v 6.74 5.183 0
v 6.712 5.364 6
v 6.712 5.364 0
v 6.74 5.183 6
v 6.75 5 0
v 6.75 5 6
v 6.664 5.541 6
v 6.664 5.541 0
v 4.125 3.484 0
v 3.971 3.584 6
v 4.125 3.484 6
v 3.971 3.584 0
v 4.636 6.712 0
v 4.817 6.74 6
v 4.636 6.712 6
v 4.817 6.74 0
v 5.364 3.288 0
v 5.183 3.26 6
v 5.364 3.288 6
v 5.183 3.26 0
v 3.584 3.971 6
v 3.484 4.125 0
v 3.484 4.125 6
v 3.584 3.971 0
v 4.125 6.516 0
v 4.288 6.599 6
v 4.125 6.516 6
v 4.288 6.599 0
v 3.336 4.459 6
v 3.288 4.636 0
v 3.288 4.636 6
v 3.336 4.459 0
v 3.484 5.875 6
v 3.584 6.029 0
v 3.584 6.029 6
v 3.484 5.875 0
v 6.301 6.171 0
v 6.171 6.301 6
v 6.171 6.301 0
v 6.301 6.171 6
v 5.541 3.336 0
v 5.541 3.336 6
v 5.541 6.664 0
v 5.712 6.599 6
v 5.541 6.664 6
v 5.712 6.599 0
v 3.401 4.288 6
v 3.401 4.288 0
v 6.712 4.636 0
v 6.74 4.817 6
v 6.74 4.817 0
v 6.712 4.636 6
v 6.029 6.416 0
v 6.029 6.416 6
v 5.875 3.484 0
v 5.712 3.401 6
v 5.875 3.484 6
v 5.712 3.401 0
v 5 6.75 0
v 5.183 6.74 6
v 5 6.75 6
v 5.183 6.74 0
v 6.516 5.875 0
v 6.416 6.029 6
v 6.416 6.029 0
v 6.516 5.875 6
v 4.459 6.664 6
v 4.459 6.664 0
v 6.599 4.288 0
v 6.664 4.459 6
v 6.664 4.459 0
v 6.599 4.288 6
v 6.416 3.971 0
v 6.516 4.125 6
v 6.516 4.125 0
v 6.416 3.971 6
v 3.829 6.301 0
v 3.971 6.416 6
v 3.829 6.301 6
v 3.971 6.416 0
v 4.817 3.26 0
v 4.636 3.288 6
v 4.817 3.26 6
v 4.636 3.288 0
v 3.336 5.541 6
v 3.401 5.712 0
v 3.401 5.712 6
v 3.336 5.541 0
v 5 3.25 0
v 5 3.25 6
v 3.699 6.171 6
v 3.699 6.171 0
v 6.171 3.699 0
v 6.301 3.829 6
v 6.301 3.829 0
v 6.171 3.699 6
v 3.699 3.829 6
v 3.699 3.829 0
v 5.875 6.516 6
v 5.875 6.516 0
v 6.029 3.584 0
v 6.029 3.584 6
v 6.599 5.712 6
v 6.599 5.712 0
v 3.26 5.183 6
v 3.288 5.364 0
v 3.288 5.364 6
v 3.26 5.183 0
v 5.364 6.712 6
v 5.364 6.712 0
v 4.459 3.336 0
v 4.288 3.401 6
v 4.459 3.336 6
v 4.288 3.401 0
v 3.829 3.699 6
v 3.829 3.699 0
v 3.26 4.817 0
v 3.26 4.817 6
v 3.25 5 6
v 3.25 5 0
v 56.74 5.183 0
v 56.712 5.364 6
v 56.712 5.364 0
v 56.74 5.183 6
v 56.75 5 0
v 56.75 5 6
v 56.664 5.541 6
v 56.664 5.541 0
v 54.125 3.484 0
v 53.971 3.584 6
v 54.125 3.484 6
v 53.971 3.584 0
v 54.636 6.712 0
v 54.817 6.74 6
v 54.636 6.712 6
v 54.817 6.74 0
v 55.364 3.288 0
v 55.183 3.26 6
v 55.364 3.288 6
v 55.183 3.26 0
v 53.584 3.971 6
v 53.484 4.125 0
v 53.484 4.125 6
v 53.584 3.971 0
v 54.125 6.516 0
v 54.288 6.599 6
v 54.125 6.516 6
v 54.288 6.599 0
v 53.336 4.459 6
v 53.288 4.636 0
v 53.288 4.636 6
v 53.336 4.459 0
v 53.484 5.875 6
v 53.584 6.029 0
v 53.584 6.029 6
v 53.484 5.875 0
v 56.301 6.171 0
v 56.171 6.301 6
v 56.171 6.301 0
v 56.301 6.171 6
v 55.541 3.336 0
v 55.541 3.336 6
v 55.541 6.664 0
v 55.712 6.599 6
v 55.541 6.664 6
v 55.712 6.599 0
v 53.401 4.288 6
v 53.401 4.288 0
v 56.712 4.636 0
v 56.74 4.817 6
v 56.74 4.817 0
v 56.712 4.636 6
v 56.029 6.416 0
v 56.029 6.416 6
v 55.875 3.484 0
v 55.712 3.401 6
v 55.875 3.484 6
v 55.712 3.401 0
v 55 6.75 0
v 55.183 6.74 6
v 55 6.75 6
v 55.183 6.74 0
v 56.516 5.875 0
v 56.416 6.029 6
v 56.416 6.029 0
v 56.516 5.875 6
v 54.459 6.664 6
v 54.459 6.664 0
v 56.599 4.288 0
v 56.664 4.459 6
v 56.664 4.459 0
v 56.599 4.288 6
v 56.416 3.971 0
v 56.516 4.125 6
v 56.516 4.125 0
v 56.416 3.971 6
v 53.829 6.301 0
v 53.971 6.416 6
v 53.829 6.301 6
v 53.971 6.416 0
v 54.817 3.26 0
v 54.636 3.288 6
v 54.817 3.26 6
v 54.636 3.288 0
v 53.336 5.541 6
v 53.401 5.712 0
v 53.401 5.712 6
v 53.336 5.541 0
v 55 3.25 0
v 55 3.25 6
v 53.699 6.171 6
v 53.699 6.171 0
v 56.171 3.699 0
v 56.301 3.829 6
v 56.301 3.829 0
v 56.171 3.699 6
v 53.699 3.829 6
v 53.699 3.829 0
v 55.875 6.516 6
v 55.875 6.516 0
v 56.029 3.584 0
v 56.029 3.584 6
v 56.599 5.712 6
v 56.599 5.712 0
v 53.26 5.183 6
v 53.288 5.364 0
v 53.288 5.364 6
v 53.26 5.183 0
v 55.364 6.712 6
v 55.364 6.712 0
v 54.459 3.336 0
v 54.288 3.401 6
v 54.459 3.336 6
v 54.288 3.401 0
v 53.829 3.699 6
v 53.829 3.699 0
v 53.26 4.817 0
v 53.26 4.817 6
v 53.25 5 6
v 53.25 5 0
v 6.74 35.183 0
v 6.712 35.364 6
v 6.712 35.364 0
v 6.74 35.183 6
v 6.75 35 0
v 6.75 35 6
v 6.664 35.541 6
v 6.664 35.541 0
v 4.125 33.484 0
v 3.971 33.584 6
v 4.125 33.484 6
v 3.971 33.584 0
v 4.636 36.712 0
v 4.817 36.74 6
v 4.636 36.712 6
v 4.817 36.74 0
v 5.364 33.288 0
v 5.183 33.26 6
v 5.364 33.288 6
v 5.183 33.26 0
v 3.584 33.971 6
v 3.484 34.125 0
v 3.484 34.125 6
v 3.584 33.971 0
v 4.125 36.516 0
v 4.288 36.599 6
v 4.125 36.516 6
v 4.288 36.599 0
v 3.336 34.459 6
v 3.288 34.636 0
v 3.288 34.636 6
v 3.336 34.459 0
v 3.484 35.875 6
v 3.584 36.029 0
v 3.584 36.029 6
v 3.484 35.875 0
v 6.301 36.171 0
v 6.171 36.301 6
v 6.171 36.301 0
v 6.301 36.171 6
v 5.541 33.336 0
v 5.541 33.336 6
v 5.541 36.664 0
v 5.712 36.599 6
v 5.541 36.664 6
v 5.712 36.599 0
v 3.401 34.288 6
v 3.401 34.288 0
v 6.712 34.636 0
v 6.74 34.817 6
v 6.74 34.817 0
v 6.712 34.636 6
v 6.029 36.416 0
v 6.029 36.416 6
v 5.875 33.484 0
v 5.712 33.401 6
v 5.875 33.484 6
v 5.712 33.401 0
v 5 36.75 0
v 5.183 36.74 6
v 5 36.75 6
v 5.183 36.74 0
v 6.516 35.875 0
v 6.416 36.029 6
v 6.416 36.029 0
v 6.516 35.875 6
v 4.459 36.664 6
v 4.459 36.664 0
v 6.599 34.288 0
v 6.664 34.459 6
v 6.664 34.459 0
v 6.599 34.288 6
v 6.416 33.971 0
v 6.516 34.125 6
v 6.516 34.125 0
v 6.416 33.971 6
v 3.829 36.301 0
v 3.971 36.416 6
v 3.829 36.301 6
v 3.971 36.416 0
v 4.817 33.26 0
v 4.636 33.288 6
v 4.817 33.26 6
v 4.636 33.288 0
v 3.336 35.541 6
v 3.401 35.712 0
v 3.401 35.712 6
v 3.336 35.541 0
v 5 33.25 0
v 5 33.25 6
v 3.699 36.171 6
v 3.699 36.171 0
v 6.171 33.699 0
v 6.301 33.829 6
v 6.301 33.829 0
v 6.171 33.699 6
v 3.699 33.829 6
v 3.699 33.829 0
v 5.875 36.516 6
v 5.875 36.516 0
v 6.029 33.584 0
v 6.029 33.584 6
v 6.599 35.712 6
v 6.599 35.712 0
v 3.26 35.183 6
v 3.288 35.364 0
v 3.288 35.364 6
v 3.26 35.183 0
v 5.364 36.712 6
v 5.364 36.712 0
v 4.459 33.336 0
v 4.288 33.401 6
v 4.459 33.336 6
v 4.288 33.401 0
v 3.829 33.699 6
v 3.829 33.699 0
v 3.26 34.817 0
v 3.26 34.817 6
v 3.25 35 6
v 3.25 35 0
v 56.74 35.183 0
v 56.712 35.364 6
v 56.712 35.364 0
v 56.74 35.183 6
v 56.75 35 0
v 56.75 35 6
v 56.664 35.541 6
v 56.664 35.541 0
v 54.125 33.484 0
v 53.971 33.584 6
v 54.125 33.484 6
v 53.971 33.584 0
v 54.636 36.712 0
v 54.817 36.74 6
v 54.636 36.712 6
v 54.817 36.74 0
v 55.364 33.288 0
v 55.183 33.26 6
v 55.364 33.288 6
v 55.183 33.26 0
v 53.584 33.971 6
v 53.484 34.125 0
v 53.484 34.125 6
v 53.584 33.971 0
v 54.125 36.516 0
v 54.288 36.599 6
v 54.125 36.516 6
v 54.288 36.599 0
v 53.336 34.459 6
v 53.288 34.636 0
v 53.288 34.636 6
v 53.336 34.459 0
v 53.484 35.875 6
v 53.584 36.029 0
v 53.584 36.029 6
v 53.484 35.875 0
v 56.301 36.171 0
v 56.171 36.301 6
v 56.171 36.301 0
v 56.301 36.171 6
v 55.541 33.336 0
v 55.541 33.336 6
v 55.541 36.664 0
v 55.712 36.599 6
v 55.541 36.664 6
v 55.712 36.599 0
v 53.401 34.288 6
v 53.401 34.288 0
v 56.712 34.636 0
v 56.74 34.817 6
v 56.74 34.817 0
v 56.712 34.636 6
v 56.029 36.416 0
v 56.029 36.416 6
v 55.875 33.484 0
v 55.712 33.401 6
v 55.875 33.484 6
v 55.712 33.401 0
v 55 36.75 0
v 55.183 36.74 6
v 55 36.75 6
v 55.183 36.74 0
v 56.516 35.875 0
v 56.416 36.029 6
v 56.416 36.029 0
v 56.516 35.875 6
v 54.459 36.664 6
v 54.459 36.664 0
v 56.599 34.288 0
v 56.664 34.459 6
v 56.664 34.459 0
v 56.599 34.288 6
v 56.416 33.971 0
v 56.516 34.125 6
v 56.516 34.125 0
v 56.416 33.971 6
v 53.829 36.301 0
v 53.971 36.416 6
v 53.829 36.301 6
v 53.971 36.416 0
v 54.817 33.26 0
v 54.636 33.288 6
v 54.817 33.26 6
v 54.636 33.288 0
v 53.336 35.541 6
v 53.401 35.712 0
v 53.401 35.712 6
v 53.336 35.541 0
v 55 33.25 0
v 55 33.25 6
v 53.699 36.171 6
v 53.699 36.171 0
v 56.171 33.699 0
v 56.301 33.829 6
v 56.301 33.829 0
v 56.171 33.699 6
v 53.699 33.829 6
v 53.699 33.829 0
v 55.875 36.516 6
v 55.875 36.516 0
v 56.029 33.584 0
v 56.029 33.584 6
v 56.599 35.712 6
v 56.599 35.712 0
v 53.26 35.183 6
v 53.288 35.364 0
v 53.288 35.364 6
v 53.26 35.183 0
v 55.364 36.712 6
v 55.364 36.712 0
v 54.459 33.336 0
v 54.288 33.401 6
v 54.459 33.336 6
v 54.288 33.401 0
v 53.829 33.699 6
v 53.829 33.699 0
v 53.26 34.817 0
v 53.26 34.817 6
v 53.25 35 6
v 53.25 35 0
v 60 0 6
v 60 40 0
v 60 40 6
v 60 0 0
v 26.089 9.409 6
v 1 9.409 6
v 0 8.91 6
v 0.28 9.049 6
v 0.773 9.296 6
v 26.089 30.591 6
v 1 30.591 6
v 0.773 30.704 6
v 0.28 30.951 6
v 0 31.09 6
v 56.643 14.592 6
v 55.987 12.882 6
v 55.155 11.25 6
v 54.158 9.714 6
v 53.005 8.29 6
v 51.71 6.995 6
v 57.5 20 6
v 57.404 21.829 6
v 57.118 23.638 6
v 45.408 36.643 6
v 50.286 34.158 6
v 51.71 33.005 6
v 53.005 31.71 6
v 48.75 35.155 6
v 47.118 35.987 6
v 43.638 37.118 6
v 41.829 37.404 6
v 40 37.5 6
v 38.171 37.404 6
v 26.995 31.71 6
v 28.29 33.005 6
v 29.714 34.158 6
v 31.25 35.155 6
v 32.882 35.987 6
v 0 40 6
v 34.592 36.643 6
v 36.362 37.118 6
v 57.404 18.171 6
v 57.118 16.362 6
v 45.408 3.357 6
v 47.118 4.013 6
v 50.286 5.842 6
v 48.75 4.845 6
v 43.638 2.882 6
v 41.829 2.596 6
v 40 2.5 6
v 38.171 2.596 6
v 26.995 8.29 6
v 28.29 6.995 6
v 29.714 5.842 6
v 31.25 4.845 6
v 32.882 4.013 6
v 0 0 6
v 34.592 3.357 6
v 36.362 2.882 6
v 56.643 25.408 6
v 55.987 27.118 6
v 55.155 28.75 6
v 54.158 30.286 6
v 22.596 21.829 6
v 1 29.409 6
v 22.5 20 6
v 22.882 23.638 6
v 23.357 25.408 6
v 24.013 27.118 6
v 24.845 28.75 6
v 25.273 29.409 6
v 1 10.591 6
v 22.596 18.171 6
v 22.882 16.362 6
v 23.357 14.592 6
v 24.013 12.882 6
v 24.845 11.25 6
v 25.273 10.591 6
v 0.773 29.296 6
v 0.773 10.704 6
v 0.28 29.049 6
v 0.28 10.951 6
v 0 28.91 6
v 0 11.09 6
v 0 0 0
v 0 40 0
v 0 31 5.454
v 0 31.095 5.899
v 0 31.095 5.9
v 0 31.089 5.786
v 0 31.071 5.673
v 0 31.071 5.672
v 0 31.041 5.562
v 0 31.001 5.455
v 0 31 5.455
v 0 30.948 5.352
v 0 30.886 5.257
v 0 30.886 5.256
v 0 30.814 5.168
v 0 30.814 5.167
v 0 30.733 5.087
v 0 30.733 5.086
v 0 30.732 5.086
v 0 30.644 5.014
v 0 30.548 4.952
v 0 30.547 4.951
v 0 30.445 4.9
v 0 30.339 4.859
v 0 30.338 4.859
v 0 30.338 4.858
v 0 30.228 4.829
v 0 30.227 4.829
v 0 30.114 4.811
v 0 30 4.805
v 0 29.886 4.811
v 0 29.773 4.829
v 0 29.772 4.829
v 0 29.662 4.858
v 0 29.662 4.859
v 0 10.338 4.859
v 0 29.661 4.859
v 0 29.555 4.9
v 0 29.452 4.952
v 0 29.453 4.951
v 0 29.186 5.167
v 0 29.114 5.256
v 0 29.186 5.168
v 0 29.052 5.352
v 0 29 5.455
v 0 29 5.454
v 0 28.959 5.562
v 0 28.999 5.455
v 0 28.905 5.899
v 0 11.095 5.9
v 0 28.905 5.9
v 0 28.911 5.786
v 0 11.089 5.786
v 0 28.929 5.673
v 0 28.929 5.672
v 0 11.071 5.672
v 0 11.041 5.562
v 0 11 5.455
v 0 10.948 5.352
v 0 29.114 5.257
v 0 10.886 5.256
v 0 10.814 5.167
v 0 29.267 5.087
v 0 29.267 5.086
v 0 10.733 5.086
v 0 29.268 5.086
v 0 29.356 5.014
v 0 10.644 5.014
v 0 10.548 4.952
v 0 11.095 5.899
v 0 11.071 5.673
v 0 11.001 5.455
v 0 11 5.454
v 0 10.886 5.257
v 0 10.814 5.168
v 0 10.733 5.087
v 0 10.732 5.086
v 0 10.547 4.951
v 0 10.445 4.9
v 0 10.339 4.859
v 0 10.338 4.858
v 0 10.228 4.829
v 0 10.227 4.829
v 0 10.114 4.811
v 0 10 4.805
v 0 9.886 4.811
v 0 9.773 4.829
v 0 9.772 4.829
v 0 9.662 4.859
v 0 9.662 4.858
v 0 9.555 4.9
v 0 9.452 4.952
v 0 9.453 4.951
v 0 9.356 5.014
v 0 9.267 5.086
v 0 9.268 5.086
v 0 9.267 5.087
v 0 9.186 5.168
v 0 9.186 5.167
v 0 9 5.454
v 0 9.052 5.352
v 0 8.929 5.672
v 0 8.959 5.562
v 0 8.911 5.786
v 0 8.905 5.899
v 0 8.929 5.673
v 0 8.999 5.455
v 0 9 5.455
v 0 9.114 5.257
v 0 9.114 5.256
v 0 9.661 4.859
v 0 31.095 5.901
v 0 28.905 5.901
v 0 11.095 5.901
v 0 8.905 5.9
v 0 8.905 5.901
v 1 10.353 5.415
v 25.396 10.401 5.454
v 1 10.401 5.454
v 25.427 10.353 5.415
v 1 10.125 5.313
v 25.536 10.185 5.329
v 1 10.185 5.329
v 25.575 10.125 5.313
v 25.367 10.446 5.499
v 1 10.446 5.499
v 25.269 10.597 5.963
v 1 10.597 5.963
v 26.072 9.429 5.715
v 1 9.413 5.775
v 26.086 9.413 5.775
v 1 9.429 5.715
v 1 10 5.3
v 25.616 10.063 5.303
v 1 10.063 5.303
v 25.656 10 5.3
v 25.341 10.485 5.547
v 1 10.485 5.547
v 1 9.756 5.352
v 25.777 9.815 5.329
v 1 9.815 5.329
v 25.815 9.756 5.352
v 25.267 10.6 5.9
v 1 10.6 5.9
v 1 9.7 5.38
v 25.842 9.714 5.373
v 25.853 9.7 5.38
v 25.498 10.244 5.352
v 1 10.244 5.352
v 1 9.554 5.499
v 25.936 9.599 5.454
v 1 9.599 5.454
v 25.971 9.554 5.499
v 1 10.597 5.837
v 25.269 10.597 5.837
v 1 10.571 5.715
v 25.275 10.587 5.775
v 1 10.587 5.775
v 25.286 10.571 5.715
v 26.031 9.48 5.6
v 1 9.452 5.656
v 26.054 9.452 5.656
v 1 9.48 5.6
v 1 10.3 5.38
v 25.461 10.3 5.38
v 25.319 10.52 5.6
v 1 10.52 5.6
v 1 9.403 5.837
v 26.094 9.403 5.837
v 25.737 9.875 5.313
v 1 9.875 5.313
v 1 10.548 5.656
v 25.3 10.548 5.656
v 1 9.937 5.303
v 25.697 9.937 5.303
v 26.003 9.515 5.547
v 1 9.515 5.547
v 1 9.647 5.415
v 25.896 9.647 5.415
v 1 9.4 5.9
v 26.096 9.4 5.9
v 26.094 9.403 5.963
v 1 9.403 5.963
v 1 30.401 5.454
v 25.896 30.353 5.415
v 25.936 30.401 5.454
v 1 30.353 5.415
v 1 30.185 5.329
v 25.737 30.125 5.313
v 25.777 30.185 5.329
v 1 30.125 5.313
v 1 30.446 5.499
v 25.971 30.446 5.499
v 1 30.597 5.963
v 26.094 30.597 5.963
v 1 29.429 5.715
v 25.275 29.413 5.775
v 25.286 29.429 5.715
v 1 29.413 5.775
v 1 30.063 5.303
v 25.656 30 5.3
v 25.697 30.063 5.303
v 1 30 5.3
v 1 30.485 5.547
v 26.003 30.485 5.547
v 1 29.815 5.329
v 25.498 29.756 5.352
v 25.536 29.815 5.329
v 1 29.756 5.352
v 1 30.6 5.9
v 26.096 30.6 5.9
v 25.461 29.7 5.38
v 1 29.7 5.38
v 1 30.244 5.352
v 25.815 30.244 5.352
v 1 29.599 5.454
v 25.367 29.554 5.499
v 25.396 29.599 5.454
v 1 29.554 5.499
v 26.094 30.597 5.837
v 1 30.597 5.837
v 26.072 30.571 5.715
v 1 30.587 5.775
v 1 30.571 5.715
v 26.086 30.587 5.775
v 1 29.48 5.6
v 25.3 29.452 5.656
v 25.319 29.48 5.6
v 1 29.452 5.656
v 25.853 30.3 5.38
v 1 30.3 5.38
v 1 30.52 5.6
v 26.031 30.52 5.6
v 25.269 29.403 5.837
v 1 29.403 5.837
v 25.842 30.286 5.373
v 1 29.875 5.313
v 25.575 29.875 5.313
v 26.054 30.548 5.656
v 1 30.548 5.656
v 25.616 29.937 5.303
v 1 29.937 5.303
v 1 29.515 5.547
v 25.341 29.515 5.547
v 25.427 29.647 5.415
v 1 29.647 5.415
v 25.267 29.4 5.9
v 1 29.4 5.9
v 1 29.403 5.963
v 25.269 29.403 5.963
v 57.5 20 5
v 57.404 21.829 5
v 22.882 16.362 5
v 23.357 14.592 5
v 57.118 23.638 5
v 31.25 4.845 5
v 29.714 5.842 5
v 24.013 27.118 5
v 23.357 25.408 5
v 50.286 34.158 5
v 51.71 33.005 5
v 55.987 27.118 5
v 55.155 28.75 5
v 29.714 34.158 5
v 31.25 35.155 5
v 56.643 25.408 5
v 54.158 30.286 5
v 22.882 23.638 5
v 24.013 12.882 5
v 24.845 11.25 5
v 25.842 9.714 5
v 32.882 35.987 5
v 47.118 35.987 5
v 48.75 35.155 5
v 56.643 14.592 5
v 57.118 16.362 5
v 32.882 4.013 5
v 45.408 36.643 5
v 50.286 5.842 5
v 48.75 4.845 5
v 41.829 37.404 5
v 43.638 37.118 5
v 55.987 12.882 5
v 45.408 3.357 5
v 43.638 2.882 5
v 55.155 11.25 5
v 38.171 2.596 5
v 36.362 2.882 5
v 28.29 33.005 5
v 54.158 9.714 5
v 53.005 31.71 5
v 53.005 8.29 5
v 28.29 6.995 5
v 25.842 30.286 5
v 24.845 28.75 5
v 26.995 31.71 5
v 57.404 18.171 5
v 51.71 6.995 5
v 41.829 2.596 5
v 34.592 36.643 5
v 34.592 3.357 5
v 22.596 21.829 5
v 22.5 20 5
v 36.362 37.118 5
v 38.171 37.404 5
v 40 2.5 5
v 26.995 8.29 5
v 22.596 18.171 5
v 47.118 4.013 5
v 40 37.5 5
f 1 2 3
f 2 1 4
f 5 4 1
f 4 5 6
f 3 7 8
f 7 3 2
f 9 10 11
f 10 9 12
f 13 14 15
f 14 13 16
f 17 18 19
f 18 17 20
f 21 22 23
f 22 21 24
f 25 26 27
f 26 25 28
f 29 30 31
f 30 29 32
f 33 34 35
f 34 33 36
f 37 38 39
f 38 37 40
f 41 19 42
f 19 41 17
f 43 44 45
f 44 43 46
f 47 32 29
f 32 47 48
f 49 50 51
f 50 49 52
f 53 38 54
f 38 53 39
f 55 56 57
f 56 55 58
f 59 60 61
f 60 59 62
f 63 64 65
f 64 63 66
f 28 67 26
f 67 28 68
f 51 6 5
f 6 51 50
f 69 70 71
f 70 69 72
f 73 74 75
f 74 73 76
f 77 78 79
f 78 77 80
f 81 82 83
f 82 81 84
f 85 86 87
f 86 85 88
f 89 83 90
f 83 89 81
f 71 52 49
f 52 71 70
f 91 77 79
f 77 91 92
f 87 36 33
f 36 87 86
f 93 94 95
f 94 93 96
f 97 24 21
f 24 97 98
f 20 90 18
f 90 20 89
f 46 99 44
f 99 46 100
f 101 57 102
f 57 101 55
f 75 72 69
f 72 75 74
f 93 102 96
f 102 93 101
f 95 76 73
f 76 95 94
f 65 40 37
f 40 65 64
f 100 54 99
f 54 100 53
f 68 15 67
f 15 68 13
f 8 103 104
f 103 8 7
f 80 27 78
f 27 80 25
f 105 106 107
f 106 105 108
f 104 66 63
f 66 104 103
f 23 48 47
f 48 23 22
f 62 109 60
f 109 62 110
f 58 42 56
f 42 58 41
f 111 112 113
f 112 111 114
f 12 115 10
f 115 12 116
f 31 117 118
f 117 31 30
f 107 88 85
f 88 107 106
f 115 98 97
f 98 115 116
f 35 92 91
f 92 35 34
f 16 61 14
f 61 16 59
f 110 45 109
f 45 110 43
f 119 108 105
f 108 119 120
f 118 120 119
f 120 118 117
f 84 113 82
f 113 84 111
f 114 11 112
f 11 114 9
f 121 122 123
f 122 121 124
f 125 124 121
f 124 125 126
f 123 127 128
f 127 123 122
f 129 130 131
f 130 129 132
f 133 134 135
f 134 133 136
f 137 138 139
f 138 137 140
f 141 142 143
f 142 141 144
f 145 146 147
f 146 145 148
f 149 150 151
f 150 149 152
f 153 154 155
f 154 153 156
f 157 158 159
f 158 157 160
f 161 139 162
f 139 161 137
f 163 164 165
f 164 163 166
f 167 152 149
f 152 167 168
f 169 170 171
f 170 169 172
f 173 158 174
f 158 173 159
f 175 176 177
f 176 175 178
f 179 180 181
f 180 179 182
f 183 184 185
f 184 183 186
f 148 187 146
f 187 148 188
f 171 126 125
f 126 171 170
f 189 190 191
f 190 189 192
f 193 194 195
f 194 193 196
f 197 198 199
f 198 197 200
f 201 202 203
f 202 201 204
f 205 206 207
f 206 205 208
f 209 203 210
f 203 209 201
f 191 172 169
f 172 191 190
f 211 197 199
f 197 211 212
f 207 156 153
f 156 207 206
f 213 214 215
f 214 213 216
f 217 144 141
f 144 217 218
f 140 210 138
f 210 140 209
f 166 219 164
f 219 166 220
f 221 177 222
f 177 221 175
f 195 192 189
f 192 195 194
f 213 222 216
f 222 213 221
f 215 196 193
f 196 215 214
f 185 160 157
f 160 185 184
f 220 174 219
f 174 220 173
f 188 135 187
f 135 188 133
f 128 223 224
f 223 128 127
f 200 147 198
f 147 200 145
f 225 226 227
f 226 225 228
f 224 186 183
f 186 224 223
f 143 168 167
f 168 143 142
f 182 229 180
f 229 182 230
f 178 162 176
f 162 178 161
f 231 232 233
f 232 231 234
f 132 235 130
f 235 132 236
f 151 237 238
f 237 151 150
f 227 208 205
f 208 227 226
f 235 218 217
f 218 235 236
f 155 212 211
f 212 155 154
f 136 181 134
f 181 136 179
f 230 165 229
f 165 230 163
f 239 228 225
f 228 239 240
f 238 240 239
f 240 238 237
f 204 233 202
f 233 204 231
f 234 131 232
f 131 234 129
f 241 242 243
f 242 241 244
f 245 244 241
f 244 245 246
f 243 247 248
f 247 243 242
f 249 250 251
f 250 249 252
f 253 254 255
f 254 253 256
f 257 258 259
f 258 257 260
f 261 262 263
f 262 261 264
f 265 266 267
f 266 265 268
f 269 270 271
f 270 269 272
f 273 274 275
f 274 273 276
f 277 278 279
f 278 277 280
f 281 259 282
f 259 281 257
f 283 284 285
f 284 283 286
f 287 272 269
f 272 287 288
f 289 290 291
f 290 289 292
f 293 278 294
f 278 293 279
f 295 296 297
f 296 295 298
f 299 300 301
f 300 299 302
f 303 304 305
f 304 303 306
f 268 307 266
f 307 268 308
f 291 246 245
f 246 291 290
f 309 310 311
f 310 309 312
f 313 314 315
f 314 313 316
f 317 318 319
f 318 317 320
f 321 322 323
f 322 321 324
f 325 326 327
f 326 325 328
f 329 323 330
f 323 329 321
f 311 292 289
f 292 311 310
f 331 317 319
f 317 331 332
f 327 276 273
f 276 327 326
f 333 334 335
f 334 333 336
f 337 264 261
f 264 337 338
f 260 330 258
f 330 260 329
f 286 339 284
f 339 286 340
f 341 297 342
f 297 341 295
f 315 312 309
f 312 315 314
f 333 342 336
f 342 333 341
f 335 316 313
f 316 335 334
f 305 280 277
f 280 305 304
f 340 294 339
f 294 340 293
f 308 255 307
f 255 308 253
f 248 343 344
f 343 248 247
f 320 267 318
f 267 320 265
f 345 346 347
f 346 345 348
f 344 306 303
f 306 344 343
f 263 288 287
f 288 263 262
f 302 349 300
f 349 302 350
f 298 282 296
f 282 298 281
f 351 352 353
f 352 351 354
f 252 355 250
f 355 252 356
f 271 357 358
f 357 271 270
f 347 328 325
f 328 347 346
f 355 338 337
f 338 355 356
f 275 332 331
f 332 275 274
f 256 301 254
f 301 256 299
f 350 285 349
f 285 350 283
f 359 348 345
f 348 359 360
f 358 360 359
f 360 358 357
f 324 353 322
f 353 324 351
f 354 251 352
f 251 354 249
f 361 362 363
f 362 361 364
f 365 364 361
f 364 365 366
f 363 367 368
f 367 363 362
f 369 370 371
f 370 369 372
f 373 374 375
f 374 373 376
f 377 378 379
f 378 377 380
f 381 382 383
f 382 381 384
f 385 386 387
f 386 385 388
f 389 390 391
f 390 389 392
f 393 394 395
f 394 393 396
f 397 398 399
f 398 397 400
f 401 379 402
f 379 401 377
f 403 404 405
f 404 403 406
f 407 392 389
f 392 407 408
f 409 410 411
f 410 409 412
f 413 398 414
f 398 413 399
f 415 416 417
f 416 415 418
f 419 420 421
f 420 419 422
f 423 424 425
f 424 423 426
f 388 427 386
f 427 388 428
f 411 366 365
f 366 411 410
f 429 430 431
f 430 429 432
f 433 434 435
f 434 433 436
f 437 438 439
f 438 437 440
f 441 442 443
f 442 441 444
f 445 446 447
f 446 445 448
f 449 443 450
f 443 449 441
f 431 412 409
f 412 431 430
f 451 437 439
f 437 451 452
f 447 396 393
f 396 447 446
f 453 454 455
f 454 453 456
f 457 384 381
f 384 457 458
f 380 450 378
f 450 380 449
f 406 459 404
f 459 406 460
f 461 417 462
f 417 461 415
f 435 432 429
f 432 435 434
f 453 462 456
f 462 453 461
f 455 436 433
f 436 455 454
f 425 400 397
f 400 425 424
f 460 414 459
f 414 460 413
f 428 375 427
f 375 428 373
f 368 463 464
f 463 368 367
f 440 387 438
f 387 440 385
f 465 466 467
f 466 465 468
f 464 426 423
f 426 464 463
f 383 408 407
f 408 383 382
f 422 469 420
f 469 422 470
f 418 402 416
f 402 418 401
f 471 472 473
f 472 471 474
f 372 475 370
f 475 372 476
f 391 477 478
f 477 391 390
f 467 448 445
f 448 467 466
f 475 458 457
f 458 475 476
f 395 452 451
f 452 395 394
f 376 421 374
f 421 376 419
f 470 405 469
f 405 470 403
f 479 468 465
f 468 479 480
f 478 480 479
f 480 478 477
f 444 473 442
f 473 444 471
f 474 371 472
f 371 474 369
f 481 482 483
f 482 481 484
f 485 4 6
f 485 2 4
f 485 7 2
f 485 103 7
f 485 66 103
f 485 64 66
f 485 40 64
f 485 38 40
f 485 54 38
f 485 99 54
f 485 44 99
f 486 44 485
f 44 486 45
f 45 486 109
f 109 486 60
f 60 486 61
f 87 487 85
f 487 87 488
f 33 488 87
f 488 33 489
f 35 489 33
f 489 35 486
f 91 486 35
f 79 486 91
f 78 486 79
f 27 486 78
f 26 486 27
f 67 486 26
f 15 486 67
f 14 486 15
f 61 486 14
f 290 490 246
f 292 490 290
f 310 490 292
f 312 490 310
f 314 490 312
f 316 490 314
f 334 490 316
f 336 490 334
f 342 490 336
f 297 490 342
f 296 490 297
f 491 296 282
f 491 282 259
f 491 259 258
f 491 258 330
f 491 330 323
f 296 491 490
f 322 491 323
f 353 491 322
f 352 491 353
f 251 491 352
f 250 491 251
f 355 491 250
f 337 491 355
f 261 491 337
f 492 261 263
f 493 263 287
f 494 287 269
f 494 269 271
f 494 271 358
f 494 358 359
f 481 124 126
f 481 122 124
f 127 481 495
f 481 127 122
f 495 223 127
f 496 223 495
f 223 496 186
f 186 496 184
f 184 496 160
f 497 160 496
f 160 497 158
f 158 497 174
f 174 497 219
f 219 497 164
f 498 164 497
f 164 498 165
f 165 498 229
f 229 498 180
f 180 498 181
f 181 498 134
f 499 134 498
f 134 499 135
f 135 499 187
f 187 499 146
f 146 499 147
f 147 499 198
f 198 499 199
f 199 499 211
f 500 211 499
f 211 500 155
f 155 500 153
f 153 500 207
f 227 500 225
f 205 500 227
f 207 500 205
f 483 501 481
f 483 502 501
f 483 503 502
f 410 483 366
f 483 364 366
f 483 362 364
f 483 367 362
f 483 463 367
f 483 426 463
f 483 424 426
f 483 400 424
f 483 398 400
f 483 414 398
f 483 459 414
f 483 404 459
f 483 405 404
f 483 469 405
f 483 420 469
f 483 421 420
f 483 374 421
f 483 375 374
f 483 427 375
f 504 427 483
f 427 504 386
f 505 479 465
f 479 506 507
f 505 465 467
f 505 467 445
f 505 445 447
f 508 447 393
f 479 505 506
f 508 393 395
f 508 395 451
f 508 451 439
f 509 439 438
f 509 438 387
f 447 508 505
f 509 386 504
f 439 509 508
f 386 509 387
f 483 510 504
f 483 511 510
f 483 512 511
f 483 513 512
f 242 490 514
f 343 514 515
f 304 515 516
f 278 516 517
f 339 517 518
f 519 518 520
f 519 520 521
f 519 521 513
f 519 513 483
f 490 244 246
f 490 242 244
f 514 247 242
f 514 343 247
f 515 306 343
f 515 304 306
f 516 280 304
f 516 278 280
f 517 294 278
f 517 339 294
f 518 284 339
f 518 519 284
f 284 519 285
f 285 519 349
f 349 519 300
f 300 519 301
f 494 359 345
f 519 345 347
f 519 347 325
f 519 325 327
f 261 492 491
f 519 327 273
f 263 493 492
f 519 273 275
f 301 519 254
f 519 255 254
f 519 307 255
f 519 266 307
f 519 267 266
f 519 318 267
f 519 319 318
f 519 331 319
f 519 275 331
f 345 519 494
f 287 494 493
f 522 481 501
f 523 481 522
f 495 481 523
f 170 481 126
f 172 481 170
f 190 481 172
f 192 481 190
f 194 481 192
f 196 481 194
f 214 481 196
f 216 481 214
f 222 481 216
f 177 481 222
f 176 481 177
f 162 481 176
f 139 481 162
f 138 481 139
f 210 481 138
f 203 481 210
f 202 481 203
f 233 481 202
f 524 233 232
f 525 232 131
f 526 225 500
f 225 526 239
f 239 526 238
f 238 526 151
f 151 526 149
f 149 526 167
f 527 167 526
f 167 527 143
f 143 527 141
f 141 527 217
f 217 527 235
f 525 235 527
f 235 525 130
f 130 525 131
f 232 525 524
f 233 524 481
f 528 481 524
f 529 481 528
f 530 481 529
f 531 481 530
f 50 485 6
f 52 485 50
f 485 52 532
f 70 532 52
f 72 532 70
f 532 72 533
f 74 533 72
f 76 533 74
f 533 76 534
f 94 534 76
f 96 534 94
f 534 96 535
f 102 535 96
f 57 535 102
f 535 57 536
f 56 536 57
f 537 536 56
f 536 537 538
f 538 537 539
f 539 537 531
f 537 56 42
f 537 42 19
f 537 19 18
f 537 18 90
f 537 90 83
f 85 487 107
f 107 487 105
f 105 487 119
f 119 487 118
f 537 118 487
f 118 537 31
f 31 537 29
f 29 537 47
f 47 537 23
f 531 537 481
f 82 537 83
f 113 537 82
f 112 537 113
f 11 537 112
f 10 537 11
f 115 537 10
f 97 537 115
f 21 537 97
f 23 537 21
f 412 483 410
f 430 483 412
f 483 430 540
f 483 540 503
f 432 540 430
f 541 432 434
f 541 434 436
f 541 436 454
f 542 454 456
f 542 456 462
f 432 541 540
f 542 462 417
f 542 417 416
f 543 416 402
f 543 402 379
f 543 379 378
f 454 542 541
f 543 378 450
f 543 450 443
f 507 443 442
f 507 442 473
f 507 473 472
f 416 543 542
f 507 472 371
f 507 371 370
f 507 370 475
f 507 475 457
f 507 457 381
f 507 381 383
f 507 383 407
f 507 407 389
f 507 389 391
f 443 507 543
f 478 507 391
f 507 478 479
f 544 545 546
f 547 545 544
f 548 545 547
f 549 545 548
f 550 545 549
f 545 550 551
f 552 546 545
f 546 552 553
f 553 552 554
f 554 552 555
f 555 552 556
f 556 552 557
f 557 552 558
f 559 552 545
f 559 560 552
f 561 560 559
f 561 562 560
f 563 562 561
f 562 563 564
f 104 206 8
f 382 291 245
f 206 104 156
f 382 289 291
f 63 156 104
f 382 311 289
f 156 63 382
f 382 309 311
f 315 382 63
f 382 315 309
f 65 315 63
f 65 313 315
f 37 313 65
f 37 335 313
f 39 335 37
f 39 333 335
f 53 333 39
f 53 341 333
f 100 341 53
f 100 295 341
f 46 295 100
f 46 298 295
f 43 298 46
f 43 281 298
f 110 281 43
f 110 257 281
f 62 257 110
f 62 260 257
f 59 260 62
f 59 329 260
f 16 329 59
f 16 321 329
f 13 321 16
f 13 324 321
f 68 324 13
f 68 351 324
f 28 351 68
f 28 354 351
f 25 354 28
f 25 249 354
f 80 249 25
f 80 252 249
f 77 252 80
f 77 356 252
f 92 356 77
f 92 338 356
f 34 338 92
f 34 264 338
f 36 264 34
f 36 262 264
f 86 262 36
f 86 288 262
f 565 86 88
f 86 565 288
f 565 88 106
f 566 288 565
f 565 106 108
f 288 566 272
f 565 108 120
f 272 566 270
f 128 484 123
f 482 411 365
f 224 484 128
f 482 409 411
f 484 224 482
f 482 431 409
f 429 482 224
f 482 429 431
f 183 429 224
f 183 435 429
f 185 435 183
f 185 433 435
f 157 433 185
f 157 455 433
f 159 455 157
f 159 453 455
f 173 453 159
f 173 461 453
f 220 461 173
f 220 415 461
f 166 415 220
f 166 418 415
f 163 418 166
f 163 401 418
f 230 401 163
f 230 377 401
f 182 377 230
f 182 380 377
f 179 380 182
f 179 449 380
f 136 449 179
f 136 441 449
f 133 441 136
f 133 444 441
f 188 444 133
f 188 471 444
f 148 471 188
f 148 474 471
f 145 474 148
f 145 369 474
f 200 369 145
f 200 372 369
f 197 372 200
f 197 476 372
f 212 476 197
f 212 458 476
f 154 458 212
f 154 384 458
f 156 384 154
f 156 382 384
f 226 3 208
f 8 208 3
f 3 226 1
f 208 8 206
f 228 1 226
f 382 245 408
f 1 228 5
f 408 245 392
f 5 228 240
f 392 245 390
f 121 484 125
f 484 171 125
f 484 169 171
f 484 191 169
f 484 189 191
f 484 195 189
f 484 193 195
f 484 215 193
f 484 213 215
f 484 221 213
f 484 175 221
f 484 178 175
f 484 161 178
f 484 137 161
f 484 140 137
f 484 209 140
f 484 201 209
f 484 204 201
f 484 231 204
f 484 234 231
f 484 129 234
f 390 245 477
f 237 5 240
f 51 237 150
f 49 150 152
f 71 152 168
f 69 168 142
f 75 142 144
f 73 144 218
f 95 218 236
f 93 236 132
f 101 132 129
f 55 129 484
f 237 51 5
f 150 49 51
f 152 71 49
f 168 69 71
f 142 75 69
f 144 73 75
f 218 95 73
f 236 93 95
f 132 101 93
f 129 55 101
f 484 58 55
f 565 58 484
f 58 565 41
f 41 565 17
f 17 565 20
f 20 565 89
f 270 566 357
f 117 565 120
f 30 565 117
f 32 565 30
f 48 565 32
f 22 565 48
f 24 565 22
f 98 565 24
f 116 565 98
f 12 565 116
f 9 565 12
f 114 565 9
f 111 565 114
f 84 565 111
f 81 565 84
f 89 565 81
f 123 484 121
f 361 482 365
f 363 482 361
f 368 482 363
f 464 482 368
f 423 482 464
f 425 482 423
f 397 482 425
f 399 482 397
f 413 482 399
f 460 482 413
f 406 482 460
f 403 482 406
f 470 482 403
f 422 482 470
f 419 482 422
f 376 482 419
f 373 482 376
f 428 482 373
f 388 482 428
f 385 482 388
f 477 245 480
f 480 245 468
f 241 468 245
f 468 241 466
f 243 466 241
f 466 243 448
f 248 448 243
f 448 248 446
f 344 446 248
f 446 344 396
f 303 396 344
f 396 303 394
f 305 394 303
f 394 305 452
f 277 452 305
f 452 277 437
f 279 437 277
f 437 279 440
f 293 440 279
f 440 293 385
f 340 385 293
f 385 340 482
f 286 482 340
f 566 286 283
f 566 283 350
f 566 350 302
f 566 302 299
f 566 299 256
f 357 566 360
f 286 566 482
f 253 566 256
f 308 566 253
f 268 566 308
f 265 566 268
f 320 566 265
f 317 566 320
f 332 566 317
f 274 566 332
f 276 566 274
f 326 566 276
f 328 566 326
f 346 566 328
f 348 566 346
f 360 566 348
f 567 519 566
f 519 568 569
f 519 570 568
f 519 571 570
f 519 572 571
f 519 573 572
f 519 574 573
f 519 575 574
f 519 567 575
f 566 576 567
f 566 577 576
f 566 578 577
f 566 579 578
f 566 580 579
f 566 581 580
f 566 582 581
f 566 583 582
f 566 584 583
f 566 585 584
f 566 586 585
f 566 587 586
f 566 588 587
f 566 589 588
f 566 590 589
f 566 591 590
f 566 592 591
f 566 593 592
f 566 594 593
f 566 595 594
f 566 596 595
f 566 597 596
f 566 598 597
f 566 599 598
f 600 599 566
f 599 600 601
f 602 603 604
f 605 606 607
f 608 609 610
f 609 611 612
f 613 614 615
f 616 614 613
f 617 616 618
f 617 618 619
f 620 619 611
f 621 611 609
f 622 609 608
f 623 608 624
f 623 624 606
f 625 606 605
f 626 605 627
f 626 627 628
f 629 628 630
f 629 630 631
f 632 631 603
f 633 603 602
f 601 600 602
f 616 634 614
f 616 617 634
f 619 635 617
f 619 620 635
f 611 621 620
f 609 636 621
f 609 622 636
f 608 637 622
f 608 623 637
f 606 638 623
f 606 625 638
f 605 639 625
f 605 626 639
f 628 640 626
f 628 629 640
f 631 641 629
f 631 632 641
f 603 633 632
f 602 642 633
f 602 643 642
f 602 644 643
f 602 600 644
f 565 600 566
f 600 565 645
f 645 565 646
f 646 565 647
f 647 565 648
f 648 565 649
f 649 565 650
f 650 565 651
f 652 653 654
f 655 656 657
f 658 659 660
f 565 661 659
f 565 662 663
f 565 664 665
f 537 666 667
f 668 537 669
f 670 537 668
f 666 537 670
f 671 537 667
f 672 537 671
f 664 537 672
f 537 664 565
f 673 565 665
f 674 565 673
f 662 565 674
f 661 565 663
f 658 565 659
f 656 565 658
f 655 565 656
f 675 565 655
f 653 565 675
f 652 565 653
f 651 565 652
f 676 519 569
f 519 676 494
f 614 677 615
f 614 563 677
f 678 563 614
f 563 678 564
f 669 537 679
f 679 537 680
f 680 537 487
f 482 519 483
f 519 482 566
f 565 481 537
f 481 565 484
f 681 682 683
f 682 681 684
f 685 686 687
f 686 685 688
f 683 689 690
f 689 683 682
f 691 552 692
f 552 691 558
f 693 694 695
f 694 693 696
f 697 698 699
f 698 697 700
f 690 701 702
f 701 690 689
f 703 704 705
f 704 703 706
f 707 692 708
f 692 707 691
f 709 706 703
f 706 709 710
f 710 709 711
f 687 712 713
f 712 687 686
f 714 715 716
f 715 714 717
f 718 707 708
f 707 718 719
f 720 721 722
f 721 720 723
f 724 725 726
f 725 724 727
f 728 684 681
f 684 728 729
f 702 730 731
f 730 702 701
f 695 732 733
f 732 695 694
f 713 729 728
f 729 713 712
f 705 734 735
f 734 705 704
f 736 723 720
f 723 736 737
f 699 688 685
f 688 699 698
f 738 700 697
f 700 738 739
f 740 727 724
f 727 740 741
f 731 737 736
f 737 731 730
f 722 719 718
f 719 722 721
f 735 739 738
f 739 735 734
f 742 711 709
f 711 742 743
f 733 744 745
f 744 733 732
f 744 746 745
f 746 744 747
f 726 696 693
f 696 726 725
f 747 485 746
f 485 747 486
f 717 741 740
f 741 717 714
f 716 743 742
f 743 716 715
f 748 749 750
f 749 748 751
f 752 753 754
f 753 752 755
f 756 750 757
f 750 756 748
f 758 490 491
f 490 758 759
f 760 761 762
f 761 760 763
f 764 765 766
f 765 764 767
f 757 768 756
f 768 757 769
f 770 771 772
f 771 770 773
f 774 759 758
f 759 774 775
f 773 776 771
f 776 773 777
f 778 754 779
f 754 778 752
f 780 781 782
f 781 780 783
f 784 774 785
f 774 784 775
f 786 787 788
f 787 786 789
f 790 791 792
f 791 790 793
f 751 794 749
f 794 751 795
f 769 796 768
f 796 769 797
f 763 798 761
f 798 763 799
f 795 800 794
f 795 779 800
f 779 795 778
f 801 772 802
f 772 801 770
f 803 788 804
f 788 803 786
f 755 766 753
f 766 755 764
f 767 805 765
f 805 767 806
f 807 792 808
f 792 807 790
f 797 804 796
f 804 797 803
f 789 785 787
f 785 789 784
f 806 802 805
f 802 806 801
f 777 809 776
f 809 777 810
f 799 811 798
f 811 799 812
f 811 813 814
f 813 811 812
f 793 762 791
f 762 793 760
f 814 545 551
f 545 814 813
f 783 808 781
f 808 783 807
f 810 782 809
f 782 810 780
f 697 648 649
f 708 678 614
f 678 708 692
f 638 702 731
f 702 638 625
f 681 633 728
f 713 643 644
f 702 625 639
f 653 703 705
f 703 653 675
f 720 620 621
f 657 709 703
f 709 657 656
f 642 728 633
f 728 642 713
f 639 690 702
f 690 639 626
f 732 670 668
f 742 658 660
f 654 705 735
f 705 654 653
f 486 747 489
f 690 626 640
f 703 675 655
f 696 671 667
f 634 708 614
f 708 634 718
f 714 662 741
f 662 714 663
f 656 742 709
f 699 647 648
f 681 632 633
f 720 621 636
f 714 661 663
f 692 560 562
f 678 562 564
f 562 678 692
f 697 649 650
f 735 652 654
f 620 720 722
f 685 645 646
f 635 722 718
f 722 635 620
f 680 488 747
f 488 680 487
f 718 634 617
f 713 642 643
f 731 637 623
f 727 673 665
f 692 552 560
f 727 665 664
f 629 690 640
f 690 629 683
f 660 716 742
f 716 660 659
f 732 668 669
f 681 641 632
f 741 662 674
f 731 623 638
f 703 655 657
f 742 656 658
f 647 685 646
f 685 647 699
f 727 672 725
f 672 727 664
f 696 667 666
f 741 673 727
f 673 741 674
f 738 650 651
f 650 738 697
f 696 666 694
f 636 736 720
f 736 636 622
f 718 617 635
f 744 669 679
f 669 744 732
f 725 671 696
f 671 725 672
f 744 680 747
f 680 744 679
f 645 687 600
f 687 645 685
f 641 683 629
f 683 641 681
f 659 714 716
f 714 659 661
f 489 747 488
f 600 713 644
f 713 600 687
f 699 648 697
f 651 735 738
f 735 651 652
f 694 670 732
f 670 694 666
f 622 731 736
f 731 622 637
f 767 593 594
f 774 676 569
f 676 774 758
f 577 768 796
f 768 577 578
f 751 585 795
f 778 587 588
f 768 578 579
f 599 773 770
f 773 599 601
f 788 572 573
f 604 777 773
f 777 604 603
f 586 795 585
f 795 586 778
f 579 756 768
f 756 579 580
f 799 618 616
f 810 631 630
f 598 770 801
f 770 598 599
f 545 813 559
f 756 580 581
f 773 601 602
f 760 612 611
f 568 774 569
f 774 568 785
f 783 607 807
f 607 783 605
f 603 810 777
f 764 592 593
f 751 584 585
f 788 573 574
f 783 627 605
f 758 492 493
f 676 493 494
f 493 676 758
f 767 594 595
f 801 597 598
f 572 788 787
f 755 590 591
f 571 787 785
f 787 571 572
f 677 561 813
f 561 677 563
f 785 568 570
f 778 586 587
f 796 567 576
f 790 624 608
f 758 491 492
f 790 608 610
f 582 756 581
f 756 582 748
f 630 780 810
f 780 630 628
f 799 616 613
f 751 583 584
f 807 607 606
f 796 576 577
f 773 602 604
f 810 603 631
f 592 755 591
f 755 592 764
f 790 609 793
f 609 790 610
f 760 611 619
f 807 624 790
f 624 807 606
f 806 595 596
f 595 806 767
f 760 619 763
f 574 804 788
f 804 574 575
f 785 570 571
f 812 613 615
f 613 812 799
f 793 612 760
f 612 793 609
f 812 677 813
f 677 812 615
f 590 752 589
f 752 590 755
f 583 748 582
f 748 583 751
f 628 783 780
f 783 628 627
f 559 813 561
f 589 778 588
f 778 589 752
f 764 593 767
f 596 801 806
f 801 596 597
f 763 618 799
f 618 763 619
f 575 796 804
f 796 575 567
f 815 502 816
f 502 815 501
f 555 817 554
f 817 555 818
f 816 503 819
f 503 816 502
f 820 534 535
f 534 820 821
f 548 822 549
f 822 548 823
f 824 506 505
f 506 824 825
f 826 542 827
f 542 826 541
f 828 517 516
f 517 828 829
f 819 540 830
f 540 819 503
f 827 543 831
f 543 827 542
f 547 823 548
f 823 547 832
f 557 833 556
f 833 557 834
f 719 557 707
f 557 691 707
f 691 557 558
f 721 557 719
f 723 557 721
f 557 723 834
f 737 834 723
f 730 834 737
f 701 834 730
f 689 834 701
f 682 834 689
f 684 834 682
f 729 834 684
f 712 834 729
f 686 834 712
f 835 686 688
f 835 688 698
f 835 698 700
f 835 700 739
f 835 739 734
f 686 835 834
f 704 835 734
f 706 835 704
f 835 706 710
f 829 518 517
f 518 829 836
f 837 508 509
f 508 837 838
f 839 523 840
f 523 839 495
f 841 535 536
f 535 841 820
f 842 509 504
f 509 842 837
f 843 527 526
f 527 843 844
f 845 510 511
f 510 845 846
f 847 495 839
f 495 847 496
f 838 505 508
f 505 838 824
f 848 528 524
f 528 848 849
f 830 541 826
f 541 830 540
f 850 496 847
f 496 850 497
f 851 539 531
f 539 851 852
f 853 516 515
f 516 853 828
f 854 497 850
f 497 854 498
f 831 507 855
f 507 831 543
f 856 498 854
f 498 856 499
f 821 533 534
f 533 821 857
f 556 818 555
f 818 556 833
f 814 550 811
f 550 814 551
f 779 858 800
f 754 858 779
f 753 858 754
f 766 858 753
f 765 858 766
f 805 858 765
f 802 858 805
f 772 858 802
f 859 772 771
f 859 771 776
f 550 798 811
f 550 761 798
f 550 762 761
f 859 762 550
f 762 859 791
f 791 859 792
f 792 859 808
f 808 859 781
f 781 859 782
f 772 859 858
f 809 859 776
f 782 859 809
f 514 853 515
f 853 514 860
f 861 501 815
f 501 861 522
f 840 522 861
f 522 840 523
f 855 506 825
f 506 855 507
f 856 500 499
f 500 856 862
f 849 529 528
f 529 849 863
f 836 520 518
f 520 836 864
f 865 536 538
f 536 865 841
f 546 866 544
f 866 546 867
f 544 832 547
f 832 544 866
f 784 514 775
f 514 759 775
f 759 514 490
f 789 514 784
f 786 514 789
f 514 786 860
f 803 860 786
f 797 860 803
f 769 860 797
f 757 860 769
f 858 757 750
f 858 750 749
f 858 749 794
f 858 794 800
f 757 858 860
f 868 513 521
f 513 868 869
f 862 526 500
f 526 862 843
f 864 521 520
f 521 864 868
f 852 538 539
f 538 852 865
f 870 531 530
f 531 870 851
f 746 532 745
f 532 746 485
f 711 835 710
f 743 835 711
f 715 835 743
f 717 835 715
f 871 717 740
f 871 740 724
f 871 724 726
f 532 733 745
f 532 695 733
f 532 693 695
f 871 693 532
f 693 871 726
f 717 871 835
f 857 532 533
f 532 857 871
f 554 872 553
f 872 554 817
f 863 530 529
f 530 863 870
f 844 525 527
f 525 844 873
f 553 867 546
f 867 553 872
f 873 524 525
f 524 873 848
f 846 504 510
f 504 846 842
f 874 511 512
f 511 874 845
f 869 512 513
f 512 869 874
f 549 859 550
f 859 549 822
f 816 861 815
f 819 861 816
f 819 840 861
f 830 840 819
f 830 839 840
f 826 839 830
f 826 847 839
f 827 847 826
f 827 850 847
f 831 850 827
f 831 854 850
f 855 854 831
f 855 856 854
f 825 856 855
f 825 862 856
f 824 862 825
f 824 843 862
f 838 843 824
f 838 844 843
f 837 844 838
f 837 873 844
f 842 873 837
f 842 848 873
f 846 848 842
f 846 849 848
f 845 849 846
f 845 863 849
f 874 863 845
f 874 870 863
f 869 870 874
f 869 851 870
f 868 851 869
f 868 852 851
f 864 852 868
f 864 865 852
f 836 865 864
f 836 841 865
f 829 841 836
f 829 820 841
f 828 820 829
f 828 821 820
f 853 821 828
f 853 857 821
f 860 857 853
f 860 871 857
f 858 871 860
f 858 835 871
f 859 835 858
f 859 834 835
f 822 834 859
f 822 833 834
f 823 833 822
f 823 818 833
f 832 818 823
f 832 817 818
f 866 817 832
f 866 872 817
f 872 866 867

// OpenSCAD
// ============================================
// bend_jig_r10.scad
// POF を R=10mm の U字（180°）に拘束する治具。
// 上面はフラット、ゲルパッド（35×35mm）が曲げ部全体を覆える広さ。
// 印刷向き：上面（U字溝側）を上向き。サポート不要。
// ============================================

include <params.scad>

// --- ローカル寸法 ---
plate_w = 60;          // x 方向
plate_d = 40;          // y 方向
plate_h = 6;           // z 方向（板厚）

bend_center_x = 40;    // U 字中心（プレート右寄り）
bend_center_y = 20;    // プレート Y 中央
inlet_y       = bend_center_y - bend_radius_mm;  // = 10
outlet_y      = bend_center_y + bend_radius_mm;  // = 30

// 溝形状：直径 pof_channel_width_mm の円筒を path に沿って差し引く。
// 円筒中心は plate_h より少し下に置き、上面に円弧の一部だけが顔を出す形。
// 深さ pof_channel_depth_mm 達成のため、軸位置 = plate_h - (depth - radius)。
channel_axis_z = plate_h - (pof_channel_depth_mm - pof_channel_width_mm / 2);

// 取付ネジ
mount_hole_d   = 3.5;          // M3 貫通クリアランス
mount_inset    = 5;            // 端からの距離

// 入口テーパ
taper_extra_d  = 1.0;
taper_len      = 1.0;

eps = 0.01;

module pof_straight_groove(y, length, x0 = 0) {
    // y 一定の直線溝を x = x0 - eps から +length の方向へ
    translate([x0 - eps, y, channel_axis_z])
        rotate([0, 90, 0])
            cylinder(d = pof_channel_width_mm, h = length + 2 * eps);
}

module pof_arc_groove() {
    // 半径 bend_radius_mm の半円弧。
    // rotate_extrude(angle=180) は 0°→180° の弧を生成し +X 開始。
    // それを Z 軸まわり -90° して開始位置を -Y にずらすと、
    //   始点 = (bend_center_x + 0, bend_center_y - R)  = (40, 10)
    //   経由 = (bend_center_x + R, bend_center_y    )  = (50, 20)
    //   終点 = (bend_center_x + 0, bend_center_y + R)  = (40, 30)
    // となり inlet/outlet 直線部に滑らかに接続する。
    translate([bend_center_x, bend_center_y, channel_axis_z])
        rotate([0, 0, -90])
            rotate_extrude(angle = 180)
                translate([bend_radius_mm, 0])
                    circle(d = pof_channel_width_mm);
}

module entry_taper(y) {
    // 入口側 (x=0) に 1mm のじょうご状テーパ
    translate([-eps, y, channel_axis_z])
        rotate([0, 90, 0])
            cylinder(
                d1 = pof_channel_width_mm + taper_extra_d,
                d2 = pof_channel_width_mm,
                h  = taper_len + eps
            );
}

module mount_holes() {
    for (xy = [
        [mount_inset,            mount_inset           ],
        [plate_w - mount_inset,  mount_inset           ],
        [mount_inset,            plate_d - mount_inset ],
        [plate_w - mount_inset,  plate_d - mount_inset ],
    ])
        translate([xy[0], xy[1], -eps])
            cylinder(d = mount_hole_d, h = plate_h + 2 * eps);
}

// 上面 重り位置決め凹（PDMS パッド中央＝U 字 bend 中央に同心）
// Ø35×1mm。PDMS パッドが乗る位置の輪郭ガイドとして機能、構造体ではない。
module weight_position_recess() {
    translate([bend_center_x, bend_center_y,
               plate_h - weight_recess_on_jig_h_mm])
        cylinder(d = weight_recess_on_jig_d_mm,
                 h = weight_recess_on_jig_h_mm + eps);
}

module bend_jig_r10() {
    difference() {
        // ベースプレート
        cube([plate_w, plate_d, plate_h]);

        // 直線部（入口・出口）。x = 0 から arc 接続点 (x = bend_center_x) まで。
        pof_straight_groove(inlet_y,  bend_center_x);
        pof_straight_groove(outlet_y, bend_center_x);

        // U 字曲げ部
        pof_arc_groove();

        // 入口テーパ
        entry_taper(inlet_y);
        entry_taper(outlet_y);

        // 4 隅 M3 貫通
        mount_holes();

        // 上面 PDMS / 重り位置決め凹（Ø35×1mm）
        weight_position_recess();
    }
}

bend_jig_r10();
